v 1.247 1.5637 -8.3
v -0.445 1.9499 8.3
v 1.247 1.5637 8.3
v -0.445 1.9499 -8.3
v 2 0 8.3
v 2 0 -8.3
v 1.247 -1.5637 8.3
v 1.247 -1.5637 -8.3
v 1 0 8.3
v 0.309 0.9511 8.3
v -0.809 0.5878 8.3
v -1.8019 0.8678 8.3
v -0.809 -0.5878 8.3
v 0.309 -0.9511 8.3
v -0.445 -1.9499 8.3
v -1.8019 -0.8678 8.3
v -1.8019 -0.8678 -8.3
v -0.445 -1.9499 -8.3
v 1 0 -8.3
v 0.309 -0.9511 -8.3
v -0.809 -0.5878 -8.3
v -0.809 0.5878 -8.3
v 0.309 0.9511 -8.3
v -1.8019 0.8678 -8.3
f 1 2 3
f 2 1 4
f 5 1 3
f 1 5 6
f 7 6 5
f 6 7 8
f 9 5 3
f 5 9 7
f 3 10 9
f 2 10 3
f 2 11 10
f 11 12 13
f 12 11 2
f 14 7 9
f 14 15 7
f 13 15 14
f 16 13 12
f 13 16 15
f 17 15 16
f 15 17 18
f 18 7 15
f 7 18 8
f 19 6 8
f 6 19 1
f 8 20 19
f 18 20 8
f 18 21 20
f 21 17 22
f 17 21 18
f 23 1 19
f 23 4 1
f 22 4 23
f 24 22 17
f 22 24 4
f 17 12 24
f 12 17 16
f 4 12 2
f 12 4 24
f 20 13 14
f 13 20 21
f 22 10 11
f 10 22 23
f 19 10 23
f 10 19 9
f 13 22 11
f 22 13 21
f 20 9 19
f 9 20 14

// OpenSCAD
// Parameters
length = 15; //[8:30:1]
center = 1; //[0:1:1]
forced_id = 0; //[0:20:1]
ptfe_nominal_od = 4; //[2:8:0.5]
ptfe_nominal_id = 2; //[1:6:0.5]
eps = 0.8; //[0.2:2:0.1]

// Tubing - complete geometry
module tubing() {
  color([0.85, 0.85, 0.8]) { // Off-white for PTFE
    difference() {
      // Outer cylinder
      translate([0, 0, center * 0 + (1 - center) * (length / 2)])
        cylinder(r=ptfe_nominal_od / 2, h=length + 2 * eps, center=true);
      // Inner cylinder
      translate([0, 0, center * 0 + (1 - center) * (length / 2)])
        cylinder(r=(forced_id > 0 ? forced_id : ptfe_nominal_id) / 2, h=length + 4 * eps, center=true);
    }
  }
}

// Assembly
module assembly() {
  tubing();
}

assembly();
